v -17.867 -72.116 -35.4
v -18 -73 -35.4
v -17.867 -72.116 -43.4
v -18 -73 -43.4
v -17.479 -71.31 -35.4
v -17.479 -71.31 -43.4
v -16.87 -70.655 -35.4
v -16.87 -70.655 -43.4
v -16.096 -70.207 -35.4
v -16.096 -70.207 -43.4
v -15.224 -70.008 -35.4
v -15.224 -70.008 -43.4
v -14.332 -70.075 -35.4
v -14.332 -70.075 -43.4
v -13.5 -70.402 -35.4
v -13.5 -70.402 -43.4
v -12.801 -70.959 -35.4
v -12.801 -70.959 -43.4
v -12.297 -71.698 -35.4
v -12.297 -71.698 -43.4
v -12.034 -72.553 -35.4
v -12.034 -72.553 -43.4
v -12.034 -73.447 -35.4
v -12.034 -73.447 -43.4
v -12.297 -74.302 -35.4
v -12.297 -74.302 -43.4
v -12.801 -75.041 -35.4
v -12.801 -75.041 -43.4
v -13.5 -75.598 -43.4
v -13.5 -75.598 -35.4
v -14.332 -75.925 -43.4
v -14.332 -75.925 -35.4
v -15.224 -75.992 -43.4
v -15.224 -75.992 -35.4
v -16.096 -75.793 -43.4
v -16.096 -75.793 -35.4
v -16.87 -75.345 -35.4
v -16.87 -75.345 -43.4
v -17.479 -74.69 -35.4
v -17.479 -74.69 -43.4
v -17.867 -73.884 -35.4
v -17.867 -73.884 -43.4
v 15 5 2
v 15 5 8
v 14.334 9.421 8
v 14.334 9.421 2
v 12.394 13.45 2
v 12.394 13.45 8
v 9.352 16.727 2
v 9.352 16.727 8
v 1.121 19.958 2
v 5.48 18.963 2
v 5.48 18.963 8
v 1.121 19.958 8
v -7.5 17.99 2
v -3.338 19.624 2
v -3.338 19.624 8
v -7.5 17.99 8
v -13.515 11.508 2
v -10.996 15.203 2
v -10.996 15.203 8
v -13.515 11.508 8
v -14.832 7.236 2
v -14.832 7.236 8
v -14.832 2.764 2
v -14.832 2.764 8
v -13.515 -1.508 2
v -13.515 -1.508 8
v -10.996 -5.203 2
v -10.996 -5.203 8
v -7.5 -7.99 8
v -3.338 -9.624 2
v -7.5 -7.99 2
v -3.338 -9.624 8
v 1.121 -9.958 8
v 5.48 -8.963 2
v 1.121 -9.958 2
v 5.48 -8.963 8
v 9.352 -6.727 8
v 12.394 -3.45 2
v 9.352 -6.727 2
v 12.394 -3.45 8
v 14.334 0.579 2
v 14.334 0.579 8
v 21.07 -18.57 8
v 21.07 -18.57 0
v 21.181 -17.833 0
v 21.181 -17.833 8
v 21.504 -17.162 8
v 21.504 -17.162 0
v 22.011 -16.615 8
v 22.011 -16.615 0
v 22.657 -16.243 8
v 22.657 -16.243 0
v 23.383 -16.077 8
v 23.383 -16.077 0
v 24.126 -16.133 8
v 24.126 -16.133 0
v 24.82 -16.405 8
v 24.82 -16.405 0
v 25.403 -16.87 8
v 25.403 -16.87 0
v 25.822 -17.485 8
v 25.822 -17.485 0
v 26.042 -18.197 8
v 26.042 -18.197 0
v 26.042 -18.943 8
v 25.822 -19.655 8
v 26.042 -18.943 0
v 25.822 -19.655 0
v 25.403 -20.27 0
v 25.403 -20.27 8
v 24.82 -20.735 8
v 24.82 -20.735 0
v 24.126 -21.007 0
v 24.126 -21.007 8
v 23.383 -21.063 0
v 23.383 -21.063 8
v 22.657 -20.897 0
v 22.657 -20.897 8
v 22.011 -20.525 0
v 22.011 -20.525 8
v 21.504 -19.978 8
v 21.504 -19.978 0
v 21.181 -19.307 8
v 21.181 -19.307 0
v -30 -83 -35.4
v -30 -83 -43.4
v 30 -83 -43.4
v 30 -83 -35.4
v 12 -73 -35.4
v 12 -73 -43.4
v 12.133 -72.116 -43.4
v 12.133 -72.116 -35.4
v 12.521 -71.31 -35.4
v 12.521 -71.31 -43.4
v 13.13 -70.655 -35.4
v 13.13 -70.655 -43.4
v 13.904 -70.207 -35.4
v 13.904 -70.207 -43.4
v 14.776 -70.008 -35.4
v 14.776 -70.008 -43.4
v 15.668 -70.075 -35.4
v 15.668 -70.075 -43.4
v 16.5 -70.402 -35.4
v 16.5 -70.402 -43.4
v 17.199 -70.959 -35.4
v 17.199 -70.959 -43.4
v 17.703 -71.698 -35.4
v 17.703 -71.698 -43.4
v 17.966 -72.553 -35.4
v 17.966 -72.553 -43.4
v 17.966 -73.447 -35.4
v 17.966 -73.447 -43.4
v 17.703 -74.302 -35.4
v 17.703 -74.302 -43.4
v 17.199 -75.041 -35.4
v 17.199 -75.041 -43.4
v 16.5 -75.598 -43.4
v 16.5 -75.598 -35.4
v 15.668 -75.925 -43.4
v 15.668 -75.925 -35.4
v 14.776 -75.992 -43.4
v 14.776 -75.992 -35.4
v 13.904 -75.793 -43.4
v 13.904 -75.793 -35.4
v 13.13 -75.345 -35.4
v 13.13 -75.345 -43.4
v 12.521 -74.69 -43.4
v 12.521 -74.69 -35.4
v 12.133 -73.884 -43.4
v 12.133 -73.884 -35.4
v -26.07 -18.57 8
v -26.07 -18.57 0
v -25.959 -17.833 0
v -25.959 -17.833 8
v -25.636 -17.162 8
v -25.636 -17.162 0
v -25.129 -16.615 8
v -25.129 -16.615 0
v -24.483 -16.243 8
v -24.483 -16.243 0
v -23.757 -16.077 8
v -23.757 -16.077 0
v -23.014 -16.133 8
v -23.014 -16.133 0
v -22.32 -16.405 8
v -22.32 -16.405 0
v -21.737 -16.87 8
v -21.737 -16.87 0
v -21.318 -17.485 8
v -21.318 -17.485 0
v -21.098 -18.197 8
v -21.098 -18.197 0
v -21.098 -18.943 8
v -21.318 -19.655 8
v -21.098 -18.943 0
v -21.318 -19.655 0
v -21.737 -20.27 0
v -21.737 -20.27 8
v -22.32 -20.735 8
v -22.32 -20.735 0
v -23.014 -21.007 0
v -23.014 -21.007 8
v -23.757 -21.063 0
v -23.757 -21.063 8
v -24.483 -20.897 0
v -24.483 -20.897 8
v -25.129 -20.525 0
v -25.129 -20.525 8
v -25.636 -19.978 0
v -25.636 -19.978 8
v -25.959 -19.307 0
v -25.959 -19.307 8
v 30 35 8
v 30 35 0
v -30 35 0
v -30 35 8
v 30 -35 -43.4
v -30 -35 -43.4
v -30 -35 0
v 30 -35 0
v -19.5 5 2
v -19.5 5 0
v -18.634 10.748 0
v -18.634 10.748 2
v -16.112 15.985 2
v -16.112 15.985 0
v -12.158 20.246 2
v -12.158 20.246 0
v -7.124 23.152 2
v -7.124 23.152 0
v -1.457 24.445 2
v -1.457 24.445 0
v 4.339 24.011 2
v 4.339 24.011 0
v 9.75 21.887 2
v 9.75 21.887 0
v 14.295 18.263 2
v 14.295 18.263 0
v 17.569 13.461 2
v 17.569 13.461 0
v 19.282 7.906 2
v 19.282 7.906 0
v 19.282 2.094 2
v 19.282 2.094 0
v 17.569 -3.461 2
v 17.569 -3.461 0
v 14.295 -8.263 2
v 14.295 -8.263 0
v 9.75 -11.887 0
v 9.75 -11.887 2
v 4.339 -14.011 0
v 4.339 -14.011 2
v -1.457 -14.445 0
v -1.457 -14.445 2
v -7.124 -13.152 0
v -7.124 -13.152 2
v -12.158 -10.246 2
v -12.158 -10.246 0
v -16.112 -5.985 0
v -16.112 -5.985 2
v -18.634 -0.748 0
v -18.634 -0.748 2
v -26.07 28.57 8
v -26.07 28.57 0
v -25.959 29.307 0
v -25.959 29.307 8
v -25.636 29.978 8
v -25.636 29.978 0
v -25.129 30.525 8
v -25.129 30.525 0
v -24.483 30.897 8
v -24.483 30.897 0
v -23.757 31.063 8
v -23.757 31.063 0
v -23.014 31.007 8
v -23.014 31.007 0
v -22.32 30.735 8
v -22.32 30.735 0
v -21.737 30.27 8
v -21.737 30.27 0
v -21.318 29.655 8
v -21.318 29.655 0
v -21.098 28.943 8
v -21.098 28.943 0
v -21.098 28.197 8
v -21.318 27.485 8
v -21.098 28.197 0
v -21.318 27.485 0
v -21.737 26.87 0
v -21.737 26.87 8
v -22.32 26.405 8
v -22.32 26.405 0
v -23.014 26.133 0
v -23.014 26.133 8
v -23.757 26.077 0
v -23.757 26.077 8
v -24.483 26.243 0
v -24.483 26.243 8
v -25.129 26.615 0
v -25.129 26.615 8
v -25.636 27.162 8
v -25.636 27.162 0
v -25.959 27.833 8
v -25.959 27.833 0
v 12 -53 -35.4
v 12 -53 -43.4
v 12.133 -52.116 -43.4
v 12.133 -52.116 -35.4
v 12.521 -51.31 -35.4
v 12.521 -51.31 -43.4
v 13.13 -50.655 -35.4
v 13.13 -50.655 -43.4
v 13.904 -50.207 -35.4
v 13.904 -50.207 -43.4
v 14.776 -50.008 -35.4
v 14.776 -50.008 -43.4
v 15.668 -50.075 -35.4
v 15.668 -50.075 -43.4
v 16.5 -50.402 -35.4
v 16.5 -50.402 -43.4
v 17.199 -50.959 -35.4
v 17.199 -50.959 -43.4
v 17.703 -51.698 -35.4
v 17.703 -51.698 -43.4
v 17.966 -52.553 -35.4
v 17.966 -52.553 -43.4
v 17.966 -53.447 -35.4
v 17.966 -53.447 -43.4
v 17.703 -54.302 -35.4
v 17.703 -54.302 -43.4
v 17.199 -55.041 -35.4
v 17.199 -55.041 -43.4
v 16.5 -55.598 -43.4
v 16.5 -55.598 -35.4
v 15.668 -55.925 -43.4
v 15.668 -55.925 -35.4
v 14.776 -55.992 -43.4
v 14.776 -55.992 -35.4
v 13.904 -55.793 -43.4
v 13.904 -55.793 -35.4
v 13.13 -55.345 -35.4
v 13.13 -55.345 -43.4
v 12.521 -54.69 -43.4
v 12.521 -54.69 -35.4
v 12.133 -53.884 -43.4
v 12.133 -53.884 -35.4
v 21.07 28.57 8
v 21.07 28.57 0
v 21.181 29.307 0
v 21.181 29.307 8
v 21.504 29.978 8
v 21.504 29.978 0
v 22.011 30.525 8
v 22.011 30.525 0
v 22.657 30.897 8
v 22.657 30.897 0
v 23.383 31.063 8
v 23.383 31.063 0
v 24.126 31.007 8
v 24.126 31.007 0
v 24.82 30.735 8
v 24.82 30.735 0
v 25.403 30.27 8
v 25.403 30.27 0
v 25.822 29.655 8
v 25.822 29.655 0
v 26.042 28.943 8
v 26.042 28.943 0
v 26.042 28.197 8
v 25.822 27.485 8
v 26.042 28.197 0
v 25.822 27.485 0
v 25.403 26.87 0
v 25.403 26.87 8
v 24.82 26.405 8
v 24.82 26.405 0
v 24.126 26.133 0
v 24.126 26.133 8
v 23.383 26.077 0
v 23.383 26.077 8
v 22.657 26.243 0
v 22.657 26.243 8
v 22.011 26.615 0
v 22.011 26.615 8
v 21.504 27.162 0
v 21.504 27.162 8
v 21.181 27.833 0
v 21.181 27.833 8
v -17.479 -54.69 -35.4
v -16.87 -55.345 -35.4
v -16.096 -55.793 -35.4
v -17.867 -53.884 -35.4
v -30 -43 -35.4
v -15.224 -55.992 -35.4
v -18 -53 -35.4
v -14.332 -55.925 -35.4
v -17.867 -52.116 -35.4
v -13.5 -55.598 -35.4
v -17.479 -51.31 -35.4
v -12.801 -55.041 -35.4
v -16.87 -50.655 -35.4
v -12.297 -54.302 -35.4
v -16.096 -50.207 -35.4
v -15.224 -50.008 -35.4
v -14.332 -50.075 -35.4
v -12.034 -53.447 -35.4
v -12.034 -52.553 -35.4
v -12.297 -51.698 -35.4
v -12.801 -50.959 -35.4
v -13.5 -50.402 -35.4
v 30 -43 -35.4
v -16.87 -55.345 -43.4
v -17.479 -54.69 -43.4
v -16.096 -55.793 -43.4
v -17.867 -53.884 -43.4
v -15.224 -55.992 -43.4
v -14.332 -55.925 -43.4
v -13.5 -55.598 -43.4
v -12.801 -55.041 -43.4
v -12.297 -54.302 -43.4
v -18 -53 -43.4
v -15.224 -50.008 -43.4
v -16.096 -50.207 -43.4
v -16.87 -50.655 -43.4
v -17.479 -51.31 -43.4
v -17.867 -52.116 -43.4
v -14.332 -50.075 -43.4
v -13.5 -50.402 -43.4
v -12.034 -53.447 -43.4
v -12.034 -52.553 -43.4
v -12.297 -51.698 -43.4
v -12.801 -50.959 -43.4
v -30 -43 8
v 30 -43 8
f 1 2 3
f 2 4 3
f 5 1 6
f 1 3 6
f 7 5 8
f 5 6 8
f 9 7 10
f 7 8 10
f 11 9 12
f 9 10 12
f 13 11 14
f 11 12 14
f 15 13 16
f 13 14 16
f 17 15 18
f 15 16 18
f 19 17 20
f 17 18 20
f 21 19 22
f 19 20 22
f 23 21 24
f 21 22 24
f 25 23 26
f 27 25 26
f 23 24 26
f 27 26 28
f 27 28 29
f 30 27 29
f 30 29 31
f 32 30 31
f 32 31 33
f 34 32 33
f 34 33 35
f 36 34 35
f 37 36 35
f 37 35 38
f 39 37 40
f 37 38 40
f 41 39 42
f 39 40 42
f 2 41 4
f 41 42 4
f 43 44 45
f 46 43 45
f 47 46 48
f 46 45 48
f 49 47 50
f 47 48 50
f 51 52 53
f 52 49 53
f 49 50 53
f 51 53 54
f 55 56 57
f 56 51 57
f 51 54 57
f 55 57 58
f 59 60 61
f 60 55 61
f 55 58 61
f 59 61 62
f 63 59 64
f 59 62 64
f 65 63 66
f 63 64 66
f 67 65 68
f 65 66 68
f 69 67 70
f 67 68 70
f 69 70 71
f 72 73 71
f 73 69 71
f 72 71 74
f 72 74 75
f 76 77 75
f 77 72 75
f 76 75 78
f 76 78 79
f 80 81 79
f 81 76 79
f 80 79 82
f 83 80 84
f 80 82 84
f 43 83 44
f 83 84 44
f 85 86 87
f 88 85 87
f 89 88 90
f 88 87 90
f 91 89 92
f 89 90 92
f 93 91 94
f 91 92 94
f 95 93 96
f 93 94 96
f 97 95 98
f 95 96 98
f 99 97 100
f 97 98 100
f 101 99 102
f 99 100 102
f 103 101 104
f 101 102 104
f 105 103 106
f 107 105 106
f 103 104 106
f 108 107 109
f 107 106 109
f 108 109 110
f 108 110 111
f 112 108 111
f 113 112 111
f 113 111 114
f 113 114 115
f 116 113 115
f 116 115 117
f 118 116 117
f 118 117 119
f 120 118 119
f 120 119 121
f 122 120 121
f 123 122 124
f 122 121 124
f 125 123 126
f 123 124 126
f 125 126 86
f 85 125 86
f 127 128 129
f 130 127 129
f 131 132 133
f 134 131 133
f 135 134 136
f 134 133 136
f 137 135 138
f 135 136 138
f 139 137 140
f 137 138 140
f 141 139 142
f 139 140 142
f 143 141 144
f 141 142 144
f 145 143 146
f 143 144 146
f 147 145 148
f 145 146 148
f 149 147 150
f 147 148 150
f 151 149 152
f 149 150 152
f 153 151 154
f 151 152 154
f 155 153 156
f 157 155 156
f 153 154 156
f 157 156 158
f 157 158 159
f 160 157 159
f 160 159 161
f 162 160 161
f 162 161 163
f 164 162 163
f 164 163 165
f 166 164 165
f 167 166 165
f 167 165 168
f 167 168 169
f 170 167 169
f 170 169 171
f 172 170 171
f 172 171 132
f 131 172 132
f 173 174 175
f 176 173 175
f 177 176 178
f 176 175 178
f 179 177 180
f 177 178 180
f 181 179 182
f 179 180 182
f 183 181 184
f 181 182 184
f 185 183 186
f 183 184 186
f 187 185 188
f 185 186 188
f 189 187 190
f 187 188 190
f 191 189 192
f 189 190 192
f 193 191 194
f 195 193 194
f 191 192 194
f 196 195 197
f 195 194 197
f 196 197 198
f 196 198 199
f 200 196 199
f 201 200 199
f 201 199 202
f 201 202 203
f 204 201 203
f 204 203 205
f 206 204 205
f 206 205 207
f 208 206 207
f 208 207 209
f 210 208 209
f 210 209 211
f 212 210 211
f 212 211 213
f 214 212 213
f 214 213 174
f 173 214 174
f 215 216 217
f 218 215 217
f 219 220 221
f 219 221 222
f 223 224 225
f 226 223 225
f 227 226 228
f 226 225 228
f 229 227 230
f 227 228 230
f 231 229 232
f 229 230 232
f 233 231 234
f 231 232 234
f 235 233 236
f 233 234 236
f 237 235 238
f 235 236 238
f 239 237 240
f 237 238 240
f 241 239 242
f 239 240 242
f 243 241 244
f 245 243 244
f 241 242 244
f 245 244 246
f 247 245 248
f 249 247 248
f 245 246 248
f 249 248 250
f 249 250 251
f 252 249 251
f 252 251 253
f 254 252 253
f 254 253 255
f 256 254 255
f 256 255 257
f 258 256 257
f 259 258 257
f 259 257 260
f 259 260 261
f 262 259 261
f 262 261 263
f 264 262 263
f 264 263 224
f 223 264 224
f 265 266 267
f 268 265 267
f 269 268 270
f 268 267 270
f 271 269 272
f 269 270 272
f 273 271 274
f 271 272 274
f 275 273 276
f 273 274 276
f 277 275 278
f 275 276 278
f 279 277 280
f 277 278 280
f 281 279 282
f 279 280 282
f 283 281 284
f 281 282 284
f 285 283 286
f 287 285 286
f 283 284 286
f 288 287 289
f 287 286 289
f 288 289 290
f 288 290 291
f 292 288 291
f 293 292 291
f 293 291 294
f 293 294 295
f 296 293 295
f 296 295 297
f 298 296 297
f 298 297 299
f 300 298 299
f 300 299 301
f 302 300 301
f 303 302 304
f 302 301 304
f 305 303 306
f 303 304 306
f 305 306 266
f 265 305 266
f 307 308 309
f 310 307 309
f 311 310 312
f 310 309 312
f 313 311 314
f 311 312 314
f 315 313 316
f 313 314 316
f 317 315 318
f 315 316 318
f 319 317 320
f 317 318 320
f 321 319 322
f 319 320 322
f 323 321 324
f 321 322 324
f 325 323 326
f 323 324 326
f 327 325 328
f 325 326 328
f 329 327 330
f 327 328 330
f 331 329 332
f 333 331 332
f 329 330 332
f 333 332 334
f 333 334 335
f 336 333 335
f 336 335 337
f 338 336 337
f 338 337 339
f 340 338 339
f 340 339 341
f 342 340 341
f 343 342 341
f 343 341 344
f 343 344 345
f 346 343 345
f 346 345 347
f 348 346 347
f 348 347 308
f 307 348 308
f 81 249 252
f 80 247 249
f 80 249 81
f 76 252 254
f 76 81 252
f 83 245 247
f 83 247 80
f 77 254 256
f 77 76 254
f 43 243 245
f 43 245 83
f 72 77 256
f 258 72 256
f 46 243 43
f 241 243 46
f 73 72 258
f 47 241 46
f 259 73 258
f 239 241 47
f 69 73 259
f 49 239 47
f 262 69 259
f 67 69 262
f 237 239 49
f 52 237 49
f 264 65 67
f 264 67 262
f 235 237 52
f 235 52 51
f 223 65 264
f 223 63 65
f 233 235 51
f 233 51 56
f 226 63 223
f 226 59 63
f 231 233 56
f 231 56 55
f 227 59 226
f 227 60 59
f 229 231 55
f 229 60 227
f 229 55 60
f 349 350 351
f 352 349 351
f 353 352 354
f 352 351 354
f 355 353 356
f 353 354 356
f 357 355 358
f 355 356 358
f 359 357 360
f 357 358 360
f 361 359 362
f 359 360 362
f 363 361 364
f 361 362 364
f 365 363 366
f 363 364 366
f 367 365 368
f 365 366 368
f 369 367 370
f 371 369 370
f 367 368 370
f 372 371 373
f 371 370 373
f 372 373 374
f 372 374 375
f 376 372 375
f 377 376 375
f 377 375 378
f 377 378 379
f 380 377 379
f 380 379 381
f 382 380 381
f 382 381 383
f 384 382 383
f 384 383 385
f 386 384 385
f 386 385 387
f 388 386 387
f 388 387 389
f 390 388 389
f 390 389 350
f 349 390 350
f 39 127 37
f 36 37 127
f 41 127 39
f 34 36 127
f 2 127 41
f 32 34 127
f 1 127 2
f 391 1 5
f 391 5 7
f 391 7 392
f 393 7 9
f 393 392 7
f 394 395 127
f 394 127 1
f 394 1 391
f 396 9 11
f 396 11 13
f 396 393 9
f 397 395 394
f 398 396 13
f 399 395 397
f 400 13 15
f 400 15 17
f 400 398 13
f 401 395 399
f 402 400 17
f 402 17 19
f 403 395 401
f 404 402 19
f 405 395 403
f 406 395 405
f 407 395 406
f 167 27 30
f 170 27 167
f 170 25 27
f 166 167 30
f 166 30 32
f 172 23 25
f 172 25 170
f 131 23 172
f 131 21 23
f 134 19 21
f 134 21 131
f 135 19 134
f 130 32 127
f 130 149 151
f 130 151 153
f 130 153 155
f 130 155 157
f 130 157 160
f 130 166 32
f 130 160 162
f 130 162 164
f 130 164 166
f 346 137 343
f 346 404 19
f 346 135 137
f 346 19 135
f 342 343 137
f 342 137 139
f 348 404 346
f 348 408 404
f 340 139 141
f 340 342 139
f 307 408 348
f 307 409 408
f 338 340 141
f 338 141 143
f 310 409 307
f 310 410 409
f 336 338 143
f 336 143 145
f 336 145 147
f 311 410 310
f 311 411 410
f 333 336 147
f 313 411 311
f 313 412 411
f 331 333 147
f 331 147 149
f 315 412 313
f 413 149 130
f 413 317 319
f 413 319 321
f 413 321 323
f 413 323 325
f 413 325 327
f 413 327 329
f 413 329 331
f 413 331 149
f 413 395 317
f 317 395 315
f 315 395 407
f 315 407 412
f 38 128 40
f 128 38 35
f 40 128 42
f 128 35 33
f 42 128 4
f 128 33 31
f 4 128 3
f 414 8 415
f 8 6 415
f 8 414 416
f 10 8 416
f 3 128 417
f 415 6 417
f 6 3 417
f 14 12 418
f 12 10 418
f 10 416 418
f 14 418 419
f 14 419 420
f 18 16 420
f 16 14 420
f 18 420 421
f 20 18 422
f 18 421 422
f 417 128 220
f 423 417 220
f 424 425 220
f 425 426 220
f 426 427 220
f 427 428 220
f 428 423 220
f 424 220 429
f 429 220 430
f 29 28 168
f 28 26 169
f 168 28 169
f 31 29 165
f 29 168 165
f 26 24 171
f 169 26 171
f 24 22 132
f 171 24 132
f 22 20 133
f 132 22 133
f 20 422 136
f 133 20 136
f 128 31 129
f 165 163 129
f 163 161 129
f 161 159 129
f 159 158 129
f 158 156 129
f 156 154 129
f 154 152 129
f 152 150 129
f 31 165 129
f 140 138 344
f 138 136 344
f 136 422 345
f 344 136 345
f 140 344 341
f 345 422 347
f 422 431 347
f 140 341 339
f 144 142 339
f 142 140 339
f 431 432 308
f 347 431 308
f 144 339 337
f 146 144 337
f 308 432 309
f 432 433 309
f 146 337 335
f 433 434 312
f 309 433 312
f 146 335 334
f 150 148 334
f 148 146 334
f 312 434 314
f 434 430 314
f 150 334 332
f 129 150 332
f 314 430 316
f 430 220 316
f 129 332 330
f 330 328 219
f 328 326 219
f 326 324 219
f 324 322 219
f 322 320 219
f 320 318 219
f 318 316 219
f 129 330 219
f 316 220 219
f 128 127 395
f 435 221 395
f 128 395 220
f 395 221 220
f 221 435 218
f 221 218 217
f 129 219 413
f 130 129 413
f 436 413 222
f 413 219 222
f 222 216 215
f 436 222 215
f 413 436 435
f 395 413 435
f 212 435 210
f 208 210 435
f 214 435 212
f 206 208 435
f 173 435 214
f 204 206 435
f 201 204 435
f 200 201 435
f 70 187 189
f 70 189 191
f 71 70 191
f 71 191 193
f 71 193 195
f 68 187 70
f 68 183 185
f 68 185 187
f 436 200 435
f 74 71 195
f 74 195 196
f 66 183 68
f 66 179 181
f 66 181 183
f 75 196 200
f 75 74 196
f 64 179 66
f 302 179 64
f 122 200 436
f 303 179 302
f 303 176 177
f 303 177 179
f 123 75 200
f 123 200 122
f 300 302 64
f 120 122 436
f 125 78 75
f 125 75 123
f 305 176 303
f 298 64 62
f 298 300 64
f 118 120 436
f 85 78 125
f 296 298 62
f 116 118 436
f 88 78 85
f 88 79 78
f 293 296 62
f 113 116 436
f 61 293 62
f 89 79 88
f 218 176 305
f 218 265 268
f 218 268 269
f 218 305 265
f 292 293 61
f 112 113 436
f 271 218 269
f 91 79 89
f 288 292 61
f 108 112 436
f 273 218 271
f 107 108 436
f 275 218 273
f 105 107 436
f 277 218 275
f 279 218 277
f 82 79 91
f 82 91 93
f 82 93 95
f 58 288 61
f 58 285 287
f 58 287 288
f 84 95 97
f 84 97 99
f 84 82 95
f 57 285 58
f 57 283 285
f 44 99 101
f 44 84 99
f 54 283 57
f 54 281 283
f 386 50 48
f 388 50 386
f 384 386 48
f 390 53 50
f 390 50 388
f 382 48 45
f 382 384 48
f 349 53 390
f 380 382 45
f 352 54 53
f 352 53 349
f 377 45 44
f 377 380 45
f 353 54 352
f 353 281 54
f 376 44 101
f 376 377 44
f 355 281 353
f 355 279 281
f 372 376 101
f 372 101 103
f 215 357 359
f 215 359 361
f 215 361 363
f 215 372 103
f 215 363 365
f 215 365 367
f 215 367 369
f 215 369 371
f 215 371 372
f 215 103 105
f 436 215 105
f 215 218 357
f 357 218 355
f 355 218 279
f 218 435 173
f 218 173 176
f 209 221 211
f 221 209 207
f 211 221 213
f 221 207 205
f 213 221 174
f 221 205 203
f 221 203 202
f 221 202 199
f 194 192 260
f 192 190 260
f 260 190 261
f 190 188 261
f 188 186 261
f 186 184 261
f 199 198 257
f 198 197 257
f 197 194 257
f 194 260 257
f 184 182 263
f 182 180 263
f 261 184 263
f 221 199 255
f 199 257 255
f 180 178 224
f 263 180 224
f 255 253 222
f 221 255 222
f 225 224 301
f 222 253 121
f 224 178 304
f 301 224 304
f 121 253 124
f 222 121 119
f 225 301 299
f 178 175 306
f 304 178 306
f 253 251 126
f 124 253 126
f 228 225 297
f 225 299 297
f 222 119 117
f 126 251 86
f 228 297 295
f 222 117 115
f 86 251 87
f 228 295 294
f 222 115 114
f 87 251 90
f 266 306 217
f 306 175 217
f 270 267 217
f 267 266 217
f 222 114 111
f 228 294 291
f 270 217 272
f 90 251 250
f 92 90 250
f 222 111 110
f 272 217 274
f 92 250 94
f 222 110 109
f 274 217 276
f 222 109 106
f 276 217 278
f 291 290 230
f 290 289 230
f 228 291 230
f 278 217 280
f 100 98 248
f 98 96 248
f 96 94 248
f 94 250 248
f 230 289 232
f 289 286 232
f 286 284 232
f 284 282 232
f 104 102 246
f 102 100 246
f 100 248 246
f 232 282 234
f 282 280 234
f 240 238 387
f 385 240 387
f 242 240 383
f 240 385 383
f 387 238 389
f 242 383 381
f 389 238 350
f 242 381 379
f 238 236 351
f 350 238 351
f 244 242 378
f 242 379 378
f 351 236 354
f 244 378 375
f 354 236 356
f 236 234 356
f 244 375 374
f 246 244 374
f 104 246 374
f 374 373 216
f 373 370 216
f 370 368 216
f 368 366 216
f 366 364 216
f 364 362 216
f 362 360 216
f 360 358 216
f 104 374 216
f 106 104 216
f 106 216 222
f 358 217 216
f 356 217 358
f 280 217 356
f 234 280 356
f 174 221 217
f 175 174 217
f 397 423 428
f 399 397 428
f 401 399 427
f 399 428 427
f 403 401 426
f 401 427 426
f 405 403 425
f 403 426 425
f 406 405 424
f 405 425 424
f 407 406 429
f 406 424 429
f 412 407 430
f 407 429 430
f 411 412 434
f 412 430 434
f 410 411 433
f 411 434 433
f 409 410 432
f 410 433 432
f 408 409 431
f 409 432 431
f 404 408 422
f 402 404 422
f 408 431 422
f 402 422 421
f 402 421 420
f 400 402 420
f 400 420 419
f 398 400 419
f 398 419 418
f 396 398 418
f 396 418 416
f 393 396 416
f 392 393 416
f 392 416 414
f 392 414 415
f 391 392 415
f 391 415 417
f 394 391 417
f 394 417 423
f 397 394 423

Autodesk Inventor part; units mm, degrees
ref_plane "YZ Plane" through (0, 0, 0) normal (1, 0, 0) x (0, 1, 0)
ref_plane "XZ Plane" through (0, 0, 0) normal (0, 1, 0) x (-1, 0, 0)
ref_plane "XY Plane" through (0, 0, 0) normal (0, 0, 1) x (1, 0, 0)
sketch "Szkic1" plane through (0, 0, 0) normal (0, 0, 1) x (1, 0, 0)
  line L0 (-30, -35) -> (30, -35)
  line L1 (30, -35) -> (30, 35)
  line L2 (30, 35) -> (-30, 35)
  line L3 (-30, 35) -> (-30, -35)
  line L4 (-30, -35) -> (30, 35) construction
  line L5 (30, -35) -> (-30, 35) construction
  point P0 (0, 0)
  dimension "d0" = 60
  dimension "d1" = 70
extrude "Wyciągnięcie proste1" add sketch "Szkic1" along normal blind 8
sketch "Szkic2" plane through (0, 0, 0) normal (0, 0, -1) x (-1, 0, 0)
  line L0 (30, -35) -> (-30, -35) projected
  line L1 (30, 35) -> (30, -35) projected
  line L2 (-30, 35) -> (30, 35) projected
  line L3 (-30, -35) -> (-30, 35) projected
  line L4 (23.57, 5) -> (23.57, 28.57)
  line L5 (23.57, 28.57) -> (-23.57, 28.57)
  line L6 (-23.57, 28.57) -> (-23.57, -18.57)
  line L7 (-23.57, -18.57) -> (23.57, -18.57)
  line L8 (23.57, -18.57) -> (23.57, 5)
  circle A0 centre (23.57, 28.57) radius 2.5
  circle A1 centre (-23.57, 28.57) radius 2.5
  circle A2 centre (-23.57, -18.57) radius 2.5
  circle A3 centre (23.57, -18.57) radius 2.5
  line L9 (0, 0) -> (0, 5)
  dimension "d6" = 47.14
  dimension "d7" = 47.14
  dimension "d8" = 47.14
  dimension "d9" = 5
  dimension "d10" = 5
  dimension "d11" = 5
  dimension "d12" = 5
  dimension "d15" = 5
extrude "Wyciągnięcie proste3" cut sketch "Szkic2" against normal up to next contours A0 L5 L4 | L4 L5 A0 | A3 L7 L8 | L8 L7 A3 | A1 L6 L5 | L5 L6 A1 | A2 L6 L7 | L7 L6 A2
sketch "Szkic4" plane through (0, 0, 8) normal (0, 0, 1) x (1, 0, 0)
  line L0 (-30, -35) -> (30, -35) projected
  line L1 (30, -35) -> (30, -43)
  line L2 (30, -43) -> (-30, -43)
  line L3 (-30, -43) -> (-30, -35)
  point P0 (0, 0)
  dimension "d18" = 8
extrude "Wyciągnięcie proste4" add sketch "Szkic4" against normal blind 43.4
sketch "Szkic5" plane through (0, 0, 8) normal (0, 0, 1) x (1, 0, 0)
  circle A0 centre (-23.57, -18.57) radius 2.5 projected
  circle A1 centre (23.57, 28.57) radius 2.5 projected
  circle A2 centre (-23.57, 28.57) radius 2.5 projected
  circle A3 centre (23.57, -18.57) radius 2.5 projected
  line L0 (30, 35) -> (30, -43) projected
  line L1 (30, 35) -> (-30, 35) projected
  line L2 (-30, 35) -> (-30, -43) projected
  line L3 (30, -43) -> (-30, -43) projected
  line L4 (23.57, -18.57) -> (-23.57, 28.57)
  line L5 (-23.57, -18.57) -> (23.57, 28.57)
  circle A4 centre (0, 5) radius 15
  point P0 (0, 0)
  dimension "d21" = 30
extrude "Wyciągnięcie proste5" cut sketch "Szkic5" against normal up to next contours A4 L4 L5 | L5 L4 A4 | L5 A4 L4 | L4 A4 L5
thread "Gwint1" size "M5x0.8" class "6H" standard "ANSI Metric M Profile" full length
thread "Gwint2" size "M5x0.8" class "6H" standard "ANSI Metric M Profile" full length
thread "Gwint3" size "M5x0.8" class "6H" standard "ANSI Metric M Profile" full length
thread "Gwint4" size "M5x0.8" class "6H" standard "ANSI Metric M Profile" full length
sketch "Szkic8" plane through (-30, -35, 0) normal (0, 1, 0) x (1, 0, 0)
  line L0 (0, 35.4) -> (60, 35.4) projected
  line L1 (0, 35.4) -> (0, 43.4)
  line L2 (0, 43.4) -> (60, 43.4)
  line L3 (60, 43.4) -> (60, 35.4)
  point P0 (30, 0)
  dimension "d46" = 8
extrude "Wyciągnięcie proste8" add sketch "Szkic8" against normal blind 48
sketch "Szkic9" plane through (30, -35, -43.4) normal (0, 0, -1) x (-1, 0, 0)
  line L0 (0, 0) -> (60, 0) projected
  line L1 (0, 0) -> (0, -48) projected
  line L2 (60, -48) -> (0, -48) projected
  line L3 (60, 0) -> (60, -48) projected
  line L4 (60, -8) -> (60, -48) projected
  line L5 (60, -48) -> (60, -38)
  line L6 (60, -38) -> (0, -38)
  line L7 (60, -38) -> (60, -18)
  line L8 (60, -18) -> (0, -18)
  line L9 (0, -8) -> (0, -48) projected
  line L10 (0, -48) -> (15, -48)
  line L11 (0, -48) -> (60, -48) projected
  line L12 (15, -48) -> (15, -18)
  line L13 (60, -48) -> (45, -48)
  line L14 (45, -48) -> (45, -18)
  circle A0 centre (45, -38) radius 3
  circle A1 centre (15, -38) radius 3
  circle A2 centre (45, -18) radius 3
  circle A3 centre (15, -18) radius 3
  point P0 (30, 35)
  dimension "d49" = 10
  dimension "d50" = 20
  dimension "d51" = 15
  dimension "d52" = 15
  dimension "d53" = 6
  dimension "d54" = 6
  dimension "d55" = 6
  dimension "d56" = 6
extrude "Wyciągnięcie proste9" cut sketch "Szkic9" against normal up to next contours A3 L8 | L8 L12 A3 | A2 L14 L8 | L8 A2 | A1 L12 L6 | L6 L12 A1 | L8 A3 L12 | A0 L14 L6 | L6 L14 A0 | L14 A2 L8 | L12 A1 L6 | L6 A1 L12 | L14 A0 L6 | L6 A0 L14
sketch "Szkic10" plane through (0, 0, 0) normal (0, 0, -1) x (-1, 0, 0)
  circle A0 centre (0, 5) radius 15 projected
  circle A1 centre (0, 5) radius 19.5
  point P0 (0, 0)
  dimension "d59" = 39
extrude "Wyciągnięcie proste10" cut sketch "Szkic10" against normal blind 2
properties part number "Uchwyt silnika krokowego osi Y"
